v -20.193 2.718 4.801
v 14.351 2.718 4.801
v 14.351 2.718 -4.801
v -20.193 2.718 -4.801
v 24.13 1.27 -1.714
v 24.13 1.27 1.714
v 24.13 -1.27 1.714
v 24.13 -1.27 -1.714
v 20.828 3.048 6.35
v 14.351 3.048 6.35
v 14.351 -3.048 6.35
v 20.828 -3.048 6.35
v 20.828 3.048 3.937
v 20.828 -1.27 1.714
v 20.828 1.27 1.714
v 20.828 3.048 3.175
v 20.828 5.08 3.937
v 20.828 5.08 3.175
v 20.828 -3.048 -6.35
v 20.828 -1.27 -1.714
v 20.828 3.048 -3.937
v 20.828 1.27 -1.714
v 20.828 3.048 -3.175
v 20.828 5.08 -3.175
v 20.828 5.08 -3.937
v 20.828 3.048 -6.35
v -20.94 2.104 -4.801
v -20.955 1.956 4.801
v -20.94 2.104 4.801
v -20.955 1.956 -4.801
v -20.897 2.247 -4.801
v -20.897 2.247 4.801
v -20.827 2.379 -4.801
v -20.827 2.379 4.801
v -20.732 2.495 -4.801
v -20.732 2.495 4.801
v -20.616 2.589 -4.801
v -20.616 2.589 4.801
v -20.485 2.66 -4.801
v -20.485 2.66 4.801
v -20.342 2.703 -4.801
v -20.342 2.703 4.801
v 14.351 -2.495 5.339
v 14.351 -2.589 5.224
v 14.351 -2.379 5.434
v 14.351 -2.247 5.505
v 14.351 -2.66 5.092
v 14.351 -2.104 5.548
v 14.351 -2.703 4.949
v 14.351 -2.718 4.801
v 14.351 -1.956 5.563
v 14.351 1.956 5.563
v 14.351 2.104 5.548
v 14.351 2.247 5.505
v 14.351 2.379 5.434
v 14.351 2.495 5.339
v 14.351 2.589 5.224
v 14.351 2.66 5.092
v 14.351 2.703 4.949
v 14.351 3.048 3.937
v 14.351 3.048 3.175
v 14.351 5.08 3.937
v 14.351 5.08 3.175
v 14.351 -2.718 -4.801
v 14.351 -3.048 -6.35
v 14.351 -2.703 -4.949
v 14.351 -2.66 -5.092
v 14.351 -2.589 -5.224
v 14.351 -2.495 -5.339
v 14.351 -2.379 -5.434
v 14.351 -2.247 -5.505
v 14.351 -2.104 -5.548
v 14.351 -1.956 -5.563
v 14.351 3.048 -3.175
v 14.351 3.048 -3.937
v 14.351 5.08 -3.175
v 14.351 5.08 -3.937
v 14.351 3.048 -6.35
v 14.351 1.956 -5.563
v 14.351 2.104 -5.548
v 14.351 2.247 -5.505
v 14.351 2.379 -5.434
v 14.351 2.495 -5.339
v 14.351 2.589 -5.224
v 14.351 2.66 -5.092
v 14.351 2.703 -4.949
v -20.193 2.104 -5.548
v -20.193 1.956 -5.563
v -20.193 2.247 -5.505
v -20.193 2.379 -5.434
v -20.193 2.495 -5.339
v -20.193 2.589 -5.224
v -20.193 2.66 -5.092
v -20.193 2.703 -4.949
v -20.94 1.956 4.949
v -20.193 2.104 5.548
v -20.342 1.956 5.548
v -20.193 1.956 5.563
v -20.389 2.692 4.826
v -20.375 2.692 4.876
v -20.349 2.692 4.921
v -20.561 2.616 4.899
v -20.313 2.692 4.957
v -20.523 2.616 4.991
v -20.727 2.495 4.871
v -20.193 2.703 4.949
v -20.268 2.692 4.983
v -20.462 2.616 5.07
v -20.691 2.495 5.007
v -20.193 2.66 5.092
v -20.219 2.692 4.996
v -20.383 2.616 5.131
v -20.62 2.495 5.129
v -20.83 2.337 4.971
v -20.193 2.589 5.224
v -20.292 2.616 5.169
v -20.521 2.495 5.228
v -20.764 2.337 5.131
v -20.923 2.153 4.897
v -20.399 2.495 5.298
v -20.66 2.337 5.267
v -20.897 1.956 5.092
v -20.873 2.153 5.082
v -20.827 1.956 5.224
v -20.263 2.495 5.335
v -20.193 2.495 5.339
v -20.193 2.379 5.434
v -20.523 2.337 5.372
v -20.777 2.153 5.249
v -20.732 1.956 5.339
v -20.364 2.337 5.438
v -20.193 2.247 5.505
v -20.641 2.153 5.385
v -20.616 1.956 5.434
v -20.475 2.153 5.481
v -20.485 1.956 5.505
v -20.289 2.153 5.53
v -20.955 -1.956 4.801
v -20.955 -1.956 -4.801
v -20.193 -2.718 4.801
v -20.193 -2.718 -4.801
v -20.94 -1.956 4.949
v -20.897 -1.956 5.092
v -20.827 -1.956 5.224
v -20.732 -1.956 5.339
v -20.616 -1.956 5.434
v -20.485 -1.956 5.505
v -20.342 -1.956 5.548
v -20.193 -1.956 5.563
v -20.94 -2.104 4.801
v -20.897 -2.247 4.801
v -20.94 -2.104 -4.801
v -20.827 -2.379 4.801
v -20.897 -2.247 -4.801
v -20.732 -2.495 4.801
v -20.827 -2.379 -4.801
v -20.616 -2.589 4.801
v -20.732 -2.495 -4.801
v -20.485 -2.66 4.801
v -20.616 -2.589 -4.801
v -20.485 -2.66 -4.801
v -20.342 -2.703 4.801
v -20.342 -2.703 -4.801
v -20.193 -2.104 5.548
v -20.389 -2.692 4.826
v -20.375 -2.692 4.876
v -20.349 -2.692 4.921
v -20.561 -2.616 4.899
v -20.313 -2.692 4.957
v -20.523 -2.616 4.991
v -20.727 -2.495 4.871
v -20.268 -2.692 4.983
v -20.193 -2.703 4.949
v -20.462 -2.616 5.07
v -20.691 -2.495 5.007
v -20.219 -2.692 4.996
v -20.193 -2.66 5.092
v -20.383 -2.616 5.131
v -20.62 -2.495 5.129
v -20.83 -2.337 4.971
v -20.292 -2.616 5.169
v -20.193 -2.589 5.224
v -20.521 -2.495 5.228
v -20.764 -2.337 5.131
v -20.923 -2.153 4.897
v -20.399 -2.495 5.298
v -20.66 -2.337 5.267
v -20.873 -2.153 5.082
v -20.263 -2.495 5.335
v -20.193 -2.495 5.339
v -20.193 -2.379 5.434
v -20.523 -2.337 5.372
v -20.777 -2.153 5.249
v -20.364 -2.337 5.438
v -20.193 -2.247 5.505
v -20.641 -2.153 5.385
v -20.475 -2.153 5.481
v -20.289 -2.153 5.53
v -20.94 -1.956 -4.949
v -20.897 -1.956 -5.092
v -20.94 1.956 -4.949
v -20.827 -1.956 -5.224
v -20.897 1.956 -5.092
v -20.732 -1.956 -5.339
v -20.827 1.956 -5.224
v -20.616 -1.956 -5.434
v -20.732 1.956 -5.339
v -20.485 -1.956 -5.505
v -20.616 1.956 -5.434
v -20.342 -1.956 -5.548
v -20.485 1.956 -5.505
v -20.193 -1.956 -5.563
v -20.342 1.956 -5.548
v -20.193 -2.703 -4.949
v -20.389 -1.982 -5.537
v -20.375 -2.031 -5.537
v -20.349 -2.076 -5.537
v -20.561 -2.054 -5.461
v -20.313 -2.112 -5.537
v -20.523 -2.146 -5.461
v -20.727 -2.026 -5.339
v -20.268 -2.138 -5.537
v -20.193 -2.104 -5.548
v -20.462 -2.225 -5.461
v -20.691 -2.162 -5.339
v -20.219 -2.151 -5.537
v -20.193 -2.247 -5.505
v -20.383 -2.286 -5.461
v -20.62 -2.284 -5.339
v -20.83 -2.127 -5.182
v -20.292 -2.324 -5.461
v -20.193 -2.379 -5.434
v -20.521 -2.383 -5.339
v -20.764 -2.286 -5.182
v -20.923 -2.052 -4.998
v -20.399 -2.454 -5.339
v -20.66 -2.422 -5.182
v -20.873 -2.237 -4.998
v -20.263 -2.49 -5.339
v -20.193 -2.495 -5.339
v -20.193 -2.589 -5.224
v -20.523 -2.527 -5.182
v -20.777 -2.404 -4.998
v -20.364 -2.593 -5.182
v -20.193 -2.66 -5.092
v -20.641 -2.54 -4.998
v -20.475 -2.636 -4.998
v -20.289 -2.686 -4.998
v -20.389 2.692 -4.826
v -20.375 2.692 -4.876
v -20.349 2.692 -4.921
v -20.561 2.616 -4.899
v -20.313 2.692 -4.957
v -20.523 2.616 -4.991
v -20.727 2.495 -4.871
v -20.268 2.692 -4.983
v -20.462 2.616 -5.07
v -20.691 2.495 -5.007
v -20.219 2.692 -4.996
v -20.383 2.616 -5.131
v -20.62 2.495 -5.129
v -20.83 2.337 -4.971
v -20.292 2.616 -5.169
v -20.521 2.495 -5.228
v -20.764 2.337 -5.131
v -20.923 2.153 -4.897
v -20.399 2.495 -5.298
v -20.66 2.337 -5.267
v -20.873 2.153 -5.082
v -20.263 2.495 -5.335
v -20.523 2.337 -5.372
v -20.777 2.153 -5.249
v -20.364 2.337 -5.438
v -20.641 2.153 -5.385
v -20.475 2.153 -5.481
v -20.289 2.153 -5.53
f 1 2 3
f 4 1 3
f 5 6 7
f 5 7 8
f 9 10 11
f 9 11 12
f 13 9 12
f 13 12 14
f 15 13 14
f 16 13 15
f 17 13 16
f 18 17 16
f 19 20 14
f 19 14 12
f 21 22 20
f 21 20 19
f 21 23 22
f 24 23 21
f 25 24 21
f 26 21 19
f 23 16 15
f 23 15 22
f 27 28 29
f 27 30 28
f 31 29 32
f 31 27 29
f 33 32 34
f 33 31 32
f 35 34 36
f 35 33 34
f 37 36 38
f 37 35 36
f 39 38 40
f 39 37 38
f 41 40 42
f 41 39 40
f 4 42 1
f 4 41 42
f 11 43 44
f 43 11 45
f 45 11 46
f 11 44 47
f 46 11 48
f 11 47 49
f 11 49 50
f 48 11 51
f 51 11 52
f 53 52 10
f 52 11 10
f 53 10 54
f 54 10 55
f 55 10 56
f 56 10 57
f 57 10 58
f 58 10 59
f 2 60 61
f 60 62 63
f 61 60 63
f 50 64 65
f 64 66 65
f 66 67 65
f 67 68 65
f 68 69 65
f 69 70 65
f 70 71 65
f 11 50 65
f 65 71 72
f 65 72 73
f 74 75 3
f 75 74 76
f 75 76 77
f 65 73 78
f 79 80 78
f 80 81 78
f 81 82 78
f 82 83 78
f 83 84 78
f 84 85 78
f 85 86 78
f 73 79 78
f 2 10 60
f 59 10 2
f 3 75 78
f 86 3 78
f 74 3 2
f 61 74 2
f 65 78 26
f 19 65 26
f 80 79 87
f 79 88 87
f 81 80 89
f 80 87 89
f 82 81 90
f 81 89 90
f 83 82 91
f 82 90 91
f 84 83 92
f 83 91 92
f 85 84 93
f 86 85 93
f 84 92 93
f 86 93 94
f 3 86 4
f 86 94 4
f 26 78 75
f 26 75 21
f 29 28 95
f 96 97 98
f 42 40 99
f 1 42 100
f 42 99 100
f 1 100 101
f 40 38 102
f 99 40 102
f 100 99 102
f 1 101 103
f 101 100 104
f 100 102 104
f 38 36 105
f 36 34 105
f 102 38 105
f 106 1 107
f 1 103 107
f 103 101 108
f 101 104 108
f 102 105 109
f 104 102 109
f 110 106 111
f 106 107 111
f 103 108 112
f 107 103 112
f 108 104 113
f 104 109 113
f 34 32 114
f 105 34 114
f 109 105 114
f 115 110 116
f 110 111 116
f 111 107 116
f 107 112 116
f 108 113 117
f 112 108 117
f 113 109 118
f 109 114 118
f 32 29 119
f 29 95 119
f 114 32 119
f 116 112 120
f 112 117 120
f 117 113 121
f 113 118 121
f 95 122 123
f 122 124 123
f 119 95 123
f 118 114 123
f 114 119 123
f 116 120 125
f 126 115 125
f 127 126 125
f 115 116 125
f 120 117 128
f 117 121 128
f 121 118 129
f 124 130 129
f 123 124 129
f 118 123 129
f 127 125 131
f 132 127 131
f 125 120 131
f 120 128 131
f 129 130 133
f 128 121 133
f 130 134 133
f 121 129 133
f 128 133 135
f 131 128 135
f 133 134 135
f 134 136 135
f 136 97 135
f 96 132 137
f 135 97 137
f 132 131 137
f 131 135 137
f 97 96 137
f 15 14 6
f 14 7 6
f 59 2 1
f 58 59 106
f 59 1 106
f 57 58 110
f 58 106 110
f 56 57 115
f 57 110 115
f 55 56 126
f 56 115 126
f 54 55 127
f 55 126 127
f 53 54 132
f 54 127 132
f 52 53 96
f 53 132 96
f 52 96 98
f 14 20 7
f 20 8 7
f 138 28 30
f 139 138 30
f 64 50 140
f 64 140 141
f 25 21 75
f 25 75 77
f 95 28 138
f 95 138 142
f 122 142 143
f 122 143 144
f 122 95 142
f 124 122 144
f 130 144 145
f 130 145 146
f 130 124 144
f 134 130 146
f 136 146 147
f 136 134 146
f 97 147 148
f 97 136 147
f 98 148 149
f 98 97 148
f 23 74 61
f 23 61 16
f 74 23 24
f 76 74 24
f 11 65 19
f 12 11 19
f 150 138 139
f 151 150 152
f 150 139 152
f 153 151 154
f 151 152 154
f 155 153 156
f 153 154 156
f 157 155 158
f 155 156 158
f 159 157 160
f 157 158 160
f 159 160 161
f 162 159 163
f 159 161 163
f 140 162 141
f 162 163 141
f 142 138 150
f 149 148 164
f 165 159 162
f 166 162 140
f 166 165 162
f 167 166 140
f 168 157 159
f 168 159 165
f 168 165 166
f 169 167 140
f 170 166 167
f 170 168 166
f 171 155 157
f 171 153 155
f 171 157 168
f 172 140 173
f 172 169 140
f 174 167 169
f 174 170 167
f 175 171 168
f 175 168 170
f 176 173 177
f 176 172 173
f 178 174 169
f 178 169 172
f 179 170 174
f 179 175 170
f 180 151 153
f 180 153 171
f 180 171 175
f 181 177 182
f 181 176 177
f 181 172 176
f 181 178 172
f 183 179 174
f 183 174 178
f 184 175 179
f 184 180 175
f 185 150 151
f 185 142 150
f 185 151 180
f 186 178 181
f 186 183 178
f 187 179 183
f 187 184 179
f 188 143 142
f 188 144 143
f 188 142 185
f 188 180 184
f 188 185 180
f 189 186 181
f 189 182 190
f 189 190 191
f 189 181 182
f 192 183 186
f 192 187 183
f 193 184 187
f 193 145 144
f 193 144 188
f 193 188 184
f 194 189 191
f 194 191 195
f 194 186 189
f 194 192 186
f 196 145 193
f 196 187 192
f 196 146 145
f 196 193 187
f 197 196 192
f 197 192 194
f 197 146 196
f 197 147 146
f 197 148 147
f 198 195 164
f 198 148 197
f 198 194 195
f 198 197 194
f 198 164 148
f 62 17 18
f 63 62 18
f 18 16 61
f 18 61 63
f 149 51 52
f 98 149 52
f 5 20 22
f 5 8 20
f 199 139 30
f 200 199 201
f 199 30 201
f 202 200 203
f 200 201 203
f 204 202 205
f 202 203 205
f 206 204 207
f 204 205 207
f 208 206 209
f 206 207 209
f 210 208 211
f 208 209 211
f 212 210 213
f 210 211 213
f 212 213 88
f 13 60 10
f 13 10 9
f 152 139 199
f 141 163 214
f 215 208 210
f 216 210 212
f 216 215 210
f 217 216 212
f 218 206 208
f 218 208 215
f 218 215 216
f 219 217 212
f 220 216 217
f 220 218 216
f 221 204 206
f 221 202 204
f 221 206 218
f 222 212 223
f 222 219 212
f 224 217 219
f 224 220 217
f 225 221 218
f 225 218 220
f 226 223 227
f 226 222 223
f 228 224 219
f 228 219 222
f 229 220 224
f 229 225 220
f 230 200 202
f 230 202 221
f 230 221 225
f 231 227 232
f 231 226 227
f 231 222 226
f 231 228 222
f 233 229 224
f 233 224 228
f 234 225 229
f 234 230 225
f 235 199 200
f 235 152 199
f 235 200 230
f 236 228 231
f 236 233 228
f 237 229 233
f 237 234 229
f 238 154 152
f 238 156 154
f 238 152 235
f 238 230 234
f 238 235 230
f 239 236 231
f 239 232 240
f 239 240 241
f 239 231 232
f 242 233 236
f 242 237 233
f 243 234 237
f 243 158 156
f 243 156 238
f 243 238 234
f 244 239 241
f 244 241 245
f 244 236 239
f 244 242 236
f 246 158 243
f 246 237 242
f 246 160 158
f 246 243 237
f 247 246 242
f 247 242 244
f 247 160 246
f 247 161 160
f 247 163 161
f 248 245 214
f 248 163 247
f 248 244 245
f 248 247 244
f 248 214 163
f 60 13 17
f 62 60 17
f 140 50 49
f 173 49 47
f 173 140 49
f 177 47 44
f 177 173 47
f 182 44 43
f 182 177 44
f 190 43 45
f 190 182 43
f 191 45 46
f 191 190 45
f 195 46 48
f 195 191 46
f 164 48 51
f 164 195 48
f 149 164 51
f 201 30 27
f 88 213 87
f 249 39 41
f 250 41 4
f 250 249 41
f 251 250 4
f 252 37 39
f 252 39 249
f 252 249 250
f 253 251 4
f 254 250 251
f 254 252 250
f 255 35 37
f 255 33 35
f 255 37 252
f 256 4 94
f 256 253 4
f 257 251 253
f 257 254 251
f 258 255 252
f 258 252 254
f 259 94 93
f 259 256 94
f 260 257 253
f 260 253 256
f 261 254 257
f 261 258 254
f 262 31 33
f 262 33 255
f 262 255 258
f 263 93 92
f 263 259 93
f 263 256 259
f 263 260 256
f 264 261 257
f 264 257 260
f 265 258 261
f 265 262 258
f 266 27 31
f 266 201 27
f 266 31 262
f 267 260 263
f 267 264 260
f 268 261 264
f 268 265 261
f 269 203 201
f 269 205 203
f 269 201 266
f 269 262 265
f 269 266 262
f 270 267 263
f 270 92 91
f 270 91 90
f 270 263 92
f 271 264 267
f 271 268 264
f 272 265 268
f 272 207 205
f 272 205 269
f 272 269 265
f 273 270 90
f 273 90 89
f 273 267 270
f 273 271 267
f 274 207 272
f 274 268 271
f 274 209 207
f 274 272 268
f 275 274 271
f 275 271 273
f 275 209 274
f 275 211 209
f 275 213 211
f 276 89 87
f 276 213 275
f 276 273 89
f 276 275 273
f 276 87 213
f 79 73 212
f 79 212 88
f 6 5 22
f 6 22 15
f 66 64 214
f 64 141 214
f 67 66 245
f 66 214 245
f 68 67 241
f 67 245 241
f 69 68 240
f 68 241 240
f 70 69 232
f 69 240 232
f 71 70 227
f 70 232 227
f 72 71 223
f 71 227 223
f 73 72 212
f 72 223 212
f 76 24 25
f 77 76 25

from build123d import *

# Parameters (mm, degrees)
SKETCH1_W           = 41.91
SKETCH1_H           = 12.7
BOSS_EXTRUDE1_DEPTH = 3.048
SKETCH2_W           = 0.762
SKETCH2_H           = 2.032
BOSS_EXTRUDE2_DEPTH = 6.604
SKETCH2_3_W         = 3.429
SKETCH2_3_H         = 1.27
BOSS_EXTRUDE3_DEPTH = 3.175
CUT_EXTRUDE1_START  = -6.604
SKETCH4_W           = 14.239901434
SKETCH4_H           = 7.9172944
SKETCH4_W_2         = 11.1252
SKETCH4_H_2         = 5.4356
CUT_EXTRUDE1_DEPTH  = 36.306
FILLET1_R           = 0.762
CUT_EXTRUDE2_DEPTH  = 0.127
SKETCH6_W           = 3.429
SKETCH6_H           = 2.54
BOSS_EXTRUDE4_DEPTH = 0.127


with BuildPart() as part:
    # Sketch1 → Boss-Extrude1 (new body, symmetric)
    with BuildSketch(Plane(origin=(0, 0, 0), x_dir=(1, 0, 0), z_dir=(0, 1, 0))):
        Rectangle(SKETCH1_W, SKETCH1_H)
    extrude(amount=BOSS_EXTRUDE1_DEPTH, both=True)

    # Sketch2 → Boss-Extrude2 (add)
    with BuildSketch(Plane(origin=(20.955, 0, 0), x_dir=(0, 0, -1), z_dir=(1, 0, 0))):
        with Locations((-3.556, 4.064)):
            Rectangle(SKETCH2_W, SKETCH2_H)
        with Locations((3.556, 4.064)):
            Rectangle(SKETCH2_W, SKETCH2_H)
    extrude(amount=-BOSS_EXTRUDE2_DEPTH)

    # Sketch2<3> → Boss-Extrude3 (add)
    with BuildSketch(Plane(origin=(20.955, 0, 0), x_dir=(0, 0, -1), z_dir=(1, 0, 0))):
        with Locations((0, 0.635)):
            Rectangle(SKETCH2_3_W, SKETCH2_3_H)
        with Locations((0, -0.635)):
            Rectangle(SKETCH2_3_W, SKETCH2_3_H)
    extrude(amount=BOSS_EXTRUDE3_DEPTH)

    # Sketch4 → Cut-Extrude1 (cut, through all)
    with BuildSketch(Plane(origin=(20.955, 0, 0), x_dir=(0, 0, -1), z_dir=(1, 0, 0)).offset(CUT_EXTRUDE1_START)):
        Rectangle(SKETCH4_W, SKETCH4_H)
        Rectangle(SKETCH4_W_2, SKETCH4_H_2, mode=Mode.SUBTRACT)
    extrude(amount=-CUT_EXTRUDE1_DEPTH, mode=Mode.SUBTRACT)

    # Fillet1
    fillet1_edges = [part.edges().sort_by_distance(p)[0] for p in [
        (-20.955, 0, 5.5626),
        (-20.955, -2.7178, 0),
        (-20.955, 0, -5.5626),
        (-20.955, 2.7178, 0),
        (-3.302, -2.7178, 5.5626),
        (-3.302, 2.7178, 5.5626),
        (-3.302, 2.7178, -5.5626),
        (-3.302, -2.7178, -5.5626),
    ]]
    fillet(fillet1_edges, radius=FILLET1_R)

    # Sketch5 → Cut-Extrude2 (cut)
    with BuildSketch(Plane(origin=(20.955, 0, 0), x_dir=(0, 0, -1), z_dir=(1, 0, 0))):
        Polygon((-6.35, -3.048), (6.35, -3.048), (6.35, 3.048), (3.937, 3.048), (3.937, 5.08), (3.175, 5.08), (3.175, 3.048), (-3.175, 3.048), (-3.175, 5.08), (-3.937, 5.08), (-3.937, 3.048), (-6.35, 3.048), align=None)
    extrude(amount=-CUT_EXTRUDE2_DEPTH, mode=Mode.SUBTRACT)

    # Sketch6 → Boss-Extrude4 (add)
    with BuildSketch(Plane.ZY.offset(-20.955)):
        Rectangle(SKETCH6_W, SKETCH6_H)
    extrude(amount=BOSS_EXTRUDE4_DEPTH)


solid = part.part
